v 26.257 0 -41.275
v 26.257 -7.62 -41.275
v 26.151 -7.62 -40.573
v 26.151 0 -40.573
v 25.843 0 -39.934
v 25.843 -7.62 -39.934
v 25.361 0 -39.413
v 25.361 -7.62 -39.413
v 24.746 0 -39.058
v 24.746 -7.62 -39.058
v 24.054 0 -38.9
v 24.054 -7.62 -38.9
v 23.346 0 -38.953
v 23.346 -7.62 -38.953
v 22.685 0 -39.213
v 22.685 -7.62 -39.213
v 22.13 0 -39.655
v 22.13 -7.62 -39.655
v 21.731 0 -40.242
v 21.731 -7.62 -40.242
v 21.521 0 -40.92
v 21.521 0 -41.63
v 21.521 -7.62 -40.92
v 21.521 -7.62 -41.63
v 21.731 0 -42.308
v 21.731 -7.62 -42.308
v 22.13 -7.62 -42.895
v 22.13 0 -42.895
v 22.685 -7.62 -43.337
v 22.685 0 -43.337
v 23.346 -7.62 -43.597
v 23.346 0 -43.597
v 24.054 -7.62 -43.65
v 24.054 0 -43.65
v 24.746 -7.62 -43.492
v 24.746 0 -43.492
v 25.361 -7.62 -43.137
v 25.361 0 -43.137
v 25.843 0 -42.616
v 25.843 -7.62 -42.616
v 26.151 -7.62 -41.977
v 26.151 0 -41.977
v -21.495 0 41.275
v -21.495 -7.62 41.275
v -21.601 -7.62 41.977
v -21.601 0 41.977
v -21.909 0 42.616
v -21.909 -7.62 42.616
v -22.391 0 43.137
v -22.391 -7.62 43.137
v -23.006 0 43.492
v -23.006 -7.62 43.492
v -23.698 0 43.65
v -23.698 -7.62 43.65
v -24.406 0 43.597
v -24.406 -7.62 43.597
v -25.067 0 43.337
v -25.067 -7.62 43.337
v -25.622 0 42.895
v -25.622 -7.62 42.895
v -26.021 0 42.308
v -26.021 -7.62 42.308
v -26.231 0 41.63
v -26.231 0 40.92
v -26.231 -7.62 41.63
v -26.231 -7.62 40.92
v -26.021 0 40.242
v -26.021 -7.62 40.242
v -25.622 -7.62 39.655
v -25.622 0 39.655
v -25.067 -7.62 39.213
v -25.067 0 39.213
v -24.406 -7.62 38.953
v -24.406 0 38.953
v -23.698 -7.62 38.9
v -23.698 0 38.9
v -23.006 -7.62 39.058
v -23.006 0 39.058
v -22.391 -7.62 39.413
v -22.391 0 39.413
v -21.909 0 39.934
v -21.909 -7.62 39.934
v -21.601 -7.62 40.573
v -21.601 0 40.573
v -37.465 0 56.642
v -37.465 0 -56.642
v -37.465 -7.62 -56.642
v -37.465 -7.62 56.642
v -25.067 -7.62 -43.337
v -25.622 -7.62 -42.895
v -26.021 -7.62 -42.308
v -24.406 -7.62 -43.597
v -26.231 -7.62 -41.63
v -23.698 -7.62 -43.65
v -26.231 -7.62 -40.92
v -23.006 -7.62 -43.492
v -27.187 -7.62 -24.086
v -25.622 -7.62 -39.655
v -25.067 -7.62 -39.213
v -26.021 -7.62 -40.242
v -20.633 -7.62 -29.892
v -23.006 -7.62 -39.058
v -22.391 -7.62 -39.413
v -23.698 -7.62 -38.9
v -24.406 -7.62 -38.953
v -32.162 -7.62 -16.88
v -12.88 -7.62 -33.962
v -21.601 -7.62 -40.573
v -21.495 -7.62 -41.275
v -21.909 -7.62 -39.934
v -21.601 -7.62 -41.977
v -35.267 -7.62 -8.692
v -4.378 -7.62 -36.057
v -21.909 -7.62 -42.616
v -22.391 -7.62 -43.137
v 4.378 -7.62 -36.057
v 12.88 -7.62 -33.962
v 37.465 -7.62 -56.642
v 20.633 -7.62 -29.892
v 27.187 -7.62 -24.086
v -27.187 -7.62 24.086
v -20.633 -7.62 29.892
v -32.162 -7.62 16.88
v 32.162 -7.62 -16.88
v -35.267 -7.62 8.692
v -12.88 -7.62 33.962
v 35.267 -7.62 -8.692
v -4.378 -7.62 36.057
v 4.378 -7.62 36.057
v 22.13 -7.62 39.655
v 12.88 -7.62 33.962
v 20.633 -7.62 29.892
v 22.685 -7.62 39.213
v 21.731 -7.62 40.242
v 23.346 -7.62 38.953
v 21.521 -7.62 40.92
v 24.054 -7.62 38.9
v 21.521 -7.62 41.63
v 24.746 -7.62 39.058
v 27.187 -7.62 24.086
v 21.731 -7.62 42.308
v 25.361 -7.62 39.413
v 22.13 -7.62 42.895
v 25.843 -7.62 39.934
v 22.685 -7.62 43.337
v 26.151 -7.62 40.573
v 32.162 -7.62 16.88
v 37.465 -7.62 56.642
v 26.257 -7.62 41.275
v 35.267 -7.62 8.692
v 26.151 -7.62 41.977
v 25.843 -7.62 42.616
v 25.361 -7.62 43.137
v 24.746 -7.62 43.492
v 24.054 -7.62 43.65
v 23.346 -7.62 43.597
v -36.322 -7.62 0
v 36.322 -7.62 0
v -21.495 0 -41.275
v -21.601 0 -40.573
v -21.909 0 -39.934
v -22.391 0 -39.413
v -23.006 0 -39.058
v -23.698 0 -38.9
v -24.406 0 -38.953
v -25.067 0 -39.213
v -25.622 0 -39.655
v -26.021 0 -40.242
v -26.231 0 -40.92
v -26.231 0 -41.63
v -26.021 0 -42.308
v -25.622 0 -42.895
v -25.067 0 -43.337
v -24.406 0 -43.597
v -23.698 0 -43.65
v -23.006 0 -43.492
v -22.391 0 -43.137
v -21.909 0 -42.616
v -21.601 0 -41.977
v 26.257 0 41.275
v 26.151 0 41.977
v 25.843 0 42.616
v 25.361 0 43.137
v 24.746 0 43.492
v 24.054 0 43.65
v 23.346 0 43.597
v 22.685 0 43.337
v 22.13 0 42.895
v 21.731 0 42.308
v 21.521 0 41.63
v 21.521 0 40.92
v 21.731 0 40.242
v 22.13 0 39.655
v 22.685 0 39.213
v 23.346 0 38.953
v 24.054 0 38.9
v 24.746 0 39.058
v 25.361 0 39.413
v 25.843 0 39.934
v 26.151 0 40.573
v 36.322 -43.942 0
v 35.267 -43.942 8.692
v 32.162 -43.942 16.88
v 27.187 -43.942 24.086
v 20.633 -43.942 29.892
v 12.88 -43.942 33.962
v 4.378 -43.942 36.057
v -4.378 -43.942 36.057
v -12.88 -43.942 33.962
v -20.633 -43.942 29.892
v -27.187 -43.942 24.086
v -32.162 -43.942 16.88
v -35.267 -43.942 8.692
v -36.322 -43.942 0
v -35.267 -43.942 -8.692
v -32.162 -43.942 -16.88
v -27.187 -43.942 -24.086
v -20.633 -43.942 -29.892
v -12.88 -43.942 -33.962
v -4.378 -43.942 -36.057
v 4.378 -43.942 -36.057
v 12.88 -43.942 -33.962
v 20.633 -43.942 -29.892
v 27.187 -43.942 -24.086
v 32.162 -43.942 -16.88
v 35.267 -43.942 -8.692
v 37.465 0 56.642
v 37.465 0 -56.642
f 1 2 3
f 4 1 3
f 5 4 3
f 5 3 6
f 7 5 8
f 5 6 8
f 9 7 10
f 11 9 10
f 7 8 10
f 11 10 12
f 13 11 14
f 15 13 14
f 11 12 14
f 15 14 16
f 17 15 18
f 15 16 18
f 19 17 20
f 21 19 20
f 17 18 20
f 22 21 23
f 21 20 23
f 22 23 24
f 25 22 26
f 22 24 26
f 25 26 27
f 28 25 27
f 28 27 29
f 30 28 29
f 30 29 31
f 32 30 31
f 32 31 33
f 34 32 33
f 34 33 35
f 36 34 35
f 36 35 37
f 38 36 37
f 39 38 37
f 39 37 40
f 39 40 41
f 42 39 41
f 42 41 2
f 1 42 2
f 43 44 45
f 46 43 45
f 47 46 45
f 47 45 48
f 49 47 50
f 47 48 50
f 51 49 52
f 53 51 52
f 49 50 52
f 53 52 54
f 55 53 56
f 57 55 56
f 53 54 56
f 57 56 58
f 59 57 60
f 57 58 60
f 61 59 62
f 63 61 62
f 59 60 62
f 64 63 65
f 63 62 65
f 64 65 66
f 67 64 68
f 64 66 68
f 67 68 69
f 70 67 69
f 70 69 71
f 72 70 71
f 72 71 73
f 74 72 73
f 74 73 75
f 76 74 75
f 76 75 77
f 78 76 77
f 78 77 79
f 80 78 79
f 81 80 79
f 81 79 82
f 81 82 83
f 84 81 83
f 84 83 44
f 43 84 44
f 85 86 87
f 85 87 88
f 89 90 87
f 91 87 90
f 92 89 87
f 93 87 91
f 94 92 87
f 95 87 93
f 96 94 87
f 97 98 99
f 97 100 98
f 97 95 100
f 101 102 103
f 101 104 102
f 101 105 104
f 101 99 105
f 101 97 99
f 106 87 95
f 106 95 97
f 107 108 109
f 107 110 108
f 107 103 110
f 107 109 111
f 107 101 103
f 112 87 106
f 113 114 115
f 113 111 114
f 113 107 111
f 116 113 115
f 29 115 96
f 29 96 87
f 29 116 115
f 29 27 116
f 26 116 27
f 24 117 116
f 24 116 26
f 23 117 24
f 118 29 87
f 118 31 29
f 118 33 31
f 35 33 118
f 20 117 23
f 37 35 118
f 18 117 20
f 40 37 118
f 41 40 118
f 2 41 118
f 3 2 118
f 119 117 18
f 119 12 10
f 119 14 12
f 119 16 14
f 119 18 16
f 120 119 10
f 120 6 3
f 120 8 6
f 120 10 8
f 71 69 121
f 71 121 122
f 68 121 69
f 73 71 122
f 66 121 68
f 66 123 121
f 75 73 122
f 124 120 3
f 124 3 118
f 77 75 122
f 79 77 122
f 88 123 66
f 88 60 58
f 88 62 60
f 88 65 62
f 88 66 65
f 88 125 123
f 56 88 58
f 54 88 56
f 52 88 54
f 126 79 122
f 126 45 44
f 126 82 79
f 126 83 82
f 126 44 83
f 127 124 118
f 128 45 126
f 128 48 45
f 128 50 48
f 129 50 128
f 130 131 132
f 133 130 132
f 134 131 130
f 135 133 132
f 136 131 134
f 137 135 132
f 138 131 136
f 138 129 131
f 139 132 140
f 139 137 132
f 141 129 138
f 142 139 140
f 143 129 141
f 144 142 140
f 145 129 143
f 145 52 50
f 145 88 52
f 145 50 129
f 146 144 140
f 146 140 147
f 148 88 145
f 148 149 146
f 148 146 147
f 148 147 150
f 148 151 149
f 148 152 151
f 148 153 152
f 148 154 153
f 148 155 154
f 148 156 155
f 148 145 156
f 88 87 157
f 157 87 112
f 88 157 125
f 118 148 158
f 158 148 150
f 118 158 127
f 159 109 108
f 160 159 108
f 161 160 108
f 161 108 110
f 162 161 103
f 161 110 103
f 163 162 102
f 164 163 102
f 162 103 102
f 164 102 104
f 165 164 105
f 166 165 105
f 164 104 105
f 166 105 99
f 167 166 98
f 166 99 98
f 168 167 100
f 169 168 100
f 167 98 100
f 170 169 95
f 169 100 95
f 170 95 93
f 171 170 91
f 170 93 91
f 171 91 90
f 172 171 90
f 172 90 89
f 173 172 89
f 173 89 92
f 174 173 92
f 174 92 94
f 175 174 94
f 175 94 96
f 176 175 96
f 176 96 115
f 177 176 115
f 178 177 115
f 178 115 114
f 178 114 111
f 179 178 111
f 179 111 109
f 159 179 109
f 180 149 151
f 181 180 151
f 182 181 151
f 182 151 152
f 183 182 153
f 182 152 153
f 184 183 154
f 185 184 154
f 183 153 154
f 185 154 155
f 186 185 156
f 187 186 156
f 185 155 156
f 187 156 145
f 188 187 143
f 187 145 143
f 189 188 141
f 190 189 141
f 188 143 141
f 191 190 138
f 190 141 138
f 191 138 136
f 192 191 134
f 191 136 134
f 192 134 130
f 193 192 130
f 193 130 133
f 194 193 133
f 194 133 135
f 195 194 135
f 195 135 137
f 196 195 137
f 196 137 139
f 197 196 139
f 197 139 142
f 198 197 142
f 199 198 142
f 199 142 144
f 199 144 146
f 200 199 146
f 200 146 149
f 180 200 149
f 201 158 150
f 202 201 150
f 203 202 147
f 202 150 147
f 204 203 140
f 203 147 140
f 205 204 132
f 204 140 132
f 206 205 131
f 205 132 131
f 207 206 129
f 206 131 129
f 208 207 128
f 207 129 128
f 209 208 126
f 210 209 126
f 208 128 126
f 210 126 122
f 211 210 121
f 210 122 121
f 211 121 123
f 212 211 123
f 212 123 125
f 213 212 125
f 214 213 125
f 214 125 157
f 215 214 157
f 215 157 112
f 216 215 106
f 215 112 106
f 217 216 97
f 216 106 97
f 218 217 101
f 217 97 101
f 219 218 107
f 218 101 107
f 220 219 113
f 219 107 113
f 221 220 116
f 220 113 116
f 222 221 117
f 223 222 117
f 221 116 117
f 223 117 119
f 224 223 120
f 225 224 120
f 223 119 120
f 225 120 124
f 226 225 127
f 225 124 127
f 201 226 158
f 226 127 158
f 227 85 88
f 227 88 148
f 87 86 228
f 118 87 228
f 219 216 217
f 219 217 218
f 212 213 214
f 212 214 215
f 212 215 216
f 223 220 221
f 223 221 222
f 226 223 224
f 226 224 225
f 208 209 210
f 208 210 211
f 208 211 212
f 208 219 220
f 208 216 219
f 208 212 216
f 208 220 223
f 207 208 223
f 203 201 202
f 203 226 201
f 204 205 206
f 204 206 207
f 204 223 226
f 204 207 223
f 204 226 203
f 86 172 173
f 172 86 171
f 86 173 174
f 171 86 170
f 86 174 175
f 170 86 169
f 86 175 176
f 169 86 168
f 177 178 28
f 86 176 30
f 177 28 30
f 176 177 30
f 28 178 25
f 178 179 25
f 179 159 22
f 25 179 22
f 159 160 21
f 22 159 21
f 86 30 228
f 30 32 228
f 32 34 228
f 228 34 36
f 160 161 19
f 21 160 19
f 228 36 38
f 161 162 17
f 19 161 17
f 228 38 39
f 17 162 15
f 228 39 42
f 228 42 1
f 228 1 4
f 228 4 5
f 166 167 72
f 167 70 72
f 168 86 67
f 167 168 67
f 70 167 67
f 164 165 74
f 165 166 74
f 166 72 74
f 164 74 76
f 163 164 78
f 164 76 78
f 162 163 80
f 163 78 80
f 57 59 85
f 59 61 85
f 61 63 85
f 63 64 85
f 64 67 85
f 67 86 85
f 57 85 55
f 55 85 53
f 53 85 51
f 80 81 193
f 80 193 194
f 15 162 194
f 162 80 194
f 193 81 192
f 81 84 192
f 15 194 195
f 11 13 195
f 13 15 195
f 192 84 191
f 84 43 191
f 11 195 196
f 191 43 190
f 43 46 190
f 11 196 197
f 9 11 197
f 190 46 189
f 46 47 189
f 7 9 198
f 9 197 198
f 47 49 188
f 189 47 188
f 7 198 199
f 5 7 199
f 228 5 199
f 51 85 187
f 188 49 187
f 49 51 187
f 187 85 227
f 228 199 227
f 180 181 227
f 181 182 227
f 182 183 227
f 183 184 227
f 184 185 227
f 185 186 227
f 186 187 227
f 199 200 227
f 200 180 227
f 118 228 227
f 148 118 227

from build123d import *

# Parameters (mm, degrees)
F0_W     = 74.93
F0_H     = 113.284
F1_DEPTH = 7.62
F2_R     = 2.38125
F3_DEPTH = 7.621
F4_R     = 36.322
F5_DEPTH = 36.322


with BuildPart() as f1:
    # F0 (on Front) → F1 (new body)
    with BuildSketch(Plane.XZ):
        Rectangle(F0_W, F0_H)
    extrude(amount=F1_DEPTH)

    # F2 (on face) → F3 (cut, through all)
    with BuildSketch(Plane.XZ.offset(7.62)):
        with Locations((23.876, 41.275)):
            Circle(F2_R)
        with Locations((-23.876, 41.275)):
            Circle(F2_R)
        with Locations((-23.876, -41.275)):
            Circle(F2_R)
        with Locations((23.876, -41.275)):
            Circle(F2_R)
    extrude(amount=-F3_DEPTH, mode=Mode.SUBTRACT)

    # F4 (on face) → F5 (join)
    with BuildSketch(Plane.XZ.offset(7.62)):
        Circle(F4_R)
    extrude(amount=F5_DEPTH)


solid = f1.part
